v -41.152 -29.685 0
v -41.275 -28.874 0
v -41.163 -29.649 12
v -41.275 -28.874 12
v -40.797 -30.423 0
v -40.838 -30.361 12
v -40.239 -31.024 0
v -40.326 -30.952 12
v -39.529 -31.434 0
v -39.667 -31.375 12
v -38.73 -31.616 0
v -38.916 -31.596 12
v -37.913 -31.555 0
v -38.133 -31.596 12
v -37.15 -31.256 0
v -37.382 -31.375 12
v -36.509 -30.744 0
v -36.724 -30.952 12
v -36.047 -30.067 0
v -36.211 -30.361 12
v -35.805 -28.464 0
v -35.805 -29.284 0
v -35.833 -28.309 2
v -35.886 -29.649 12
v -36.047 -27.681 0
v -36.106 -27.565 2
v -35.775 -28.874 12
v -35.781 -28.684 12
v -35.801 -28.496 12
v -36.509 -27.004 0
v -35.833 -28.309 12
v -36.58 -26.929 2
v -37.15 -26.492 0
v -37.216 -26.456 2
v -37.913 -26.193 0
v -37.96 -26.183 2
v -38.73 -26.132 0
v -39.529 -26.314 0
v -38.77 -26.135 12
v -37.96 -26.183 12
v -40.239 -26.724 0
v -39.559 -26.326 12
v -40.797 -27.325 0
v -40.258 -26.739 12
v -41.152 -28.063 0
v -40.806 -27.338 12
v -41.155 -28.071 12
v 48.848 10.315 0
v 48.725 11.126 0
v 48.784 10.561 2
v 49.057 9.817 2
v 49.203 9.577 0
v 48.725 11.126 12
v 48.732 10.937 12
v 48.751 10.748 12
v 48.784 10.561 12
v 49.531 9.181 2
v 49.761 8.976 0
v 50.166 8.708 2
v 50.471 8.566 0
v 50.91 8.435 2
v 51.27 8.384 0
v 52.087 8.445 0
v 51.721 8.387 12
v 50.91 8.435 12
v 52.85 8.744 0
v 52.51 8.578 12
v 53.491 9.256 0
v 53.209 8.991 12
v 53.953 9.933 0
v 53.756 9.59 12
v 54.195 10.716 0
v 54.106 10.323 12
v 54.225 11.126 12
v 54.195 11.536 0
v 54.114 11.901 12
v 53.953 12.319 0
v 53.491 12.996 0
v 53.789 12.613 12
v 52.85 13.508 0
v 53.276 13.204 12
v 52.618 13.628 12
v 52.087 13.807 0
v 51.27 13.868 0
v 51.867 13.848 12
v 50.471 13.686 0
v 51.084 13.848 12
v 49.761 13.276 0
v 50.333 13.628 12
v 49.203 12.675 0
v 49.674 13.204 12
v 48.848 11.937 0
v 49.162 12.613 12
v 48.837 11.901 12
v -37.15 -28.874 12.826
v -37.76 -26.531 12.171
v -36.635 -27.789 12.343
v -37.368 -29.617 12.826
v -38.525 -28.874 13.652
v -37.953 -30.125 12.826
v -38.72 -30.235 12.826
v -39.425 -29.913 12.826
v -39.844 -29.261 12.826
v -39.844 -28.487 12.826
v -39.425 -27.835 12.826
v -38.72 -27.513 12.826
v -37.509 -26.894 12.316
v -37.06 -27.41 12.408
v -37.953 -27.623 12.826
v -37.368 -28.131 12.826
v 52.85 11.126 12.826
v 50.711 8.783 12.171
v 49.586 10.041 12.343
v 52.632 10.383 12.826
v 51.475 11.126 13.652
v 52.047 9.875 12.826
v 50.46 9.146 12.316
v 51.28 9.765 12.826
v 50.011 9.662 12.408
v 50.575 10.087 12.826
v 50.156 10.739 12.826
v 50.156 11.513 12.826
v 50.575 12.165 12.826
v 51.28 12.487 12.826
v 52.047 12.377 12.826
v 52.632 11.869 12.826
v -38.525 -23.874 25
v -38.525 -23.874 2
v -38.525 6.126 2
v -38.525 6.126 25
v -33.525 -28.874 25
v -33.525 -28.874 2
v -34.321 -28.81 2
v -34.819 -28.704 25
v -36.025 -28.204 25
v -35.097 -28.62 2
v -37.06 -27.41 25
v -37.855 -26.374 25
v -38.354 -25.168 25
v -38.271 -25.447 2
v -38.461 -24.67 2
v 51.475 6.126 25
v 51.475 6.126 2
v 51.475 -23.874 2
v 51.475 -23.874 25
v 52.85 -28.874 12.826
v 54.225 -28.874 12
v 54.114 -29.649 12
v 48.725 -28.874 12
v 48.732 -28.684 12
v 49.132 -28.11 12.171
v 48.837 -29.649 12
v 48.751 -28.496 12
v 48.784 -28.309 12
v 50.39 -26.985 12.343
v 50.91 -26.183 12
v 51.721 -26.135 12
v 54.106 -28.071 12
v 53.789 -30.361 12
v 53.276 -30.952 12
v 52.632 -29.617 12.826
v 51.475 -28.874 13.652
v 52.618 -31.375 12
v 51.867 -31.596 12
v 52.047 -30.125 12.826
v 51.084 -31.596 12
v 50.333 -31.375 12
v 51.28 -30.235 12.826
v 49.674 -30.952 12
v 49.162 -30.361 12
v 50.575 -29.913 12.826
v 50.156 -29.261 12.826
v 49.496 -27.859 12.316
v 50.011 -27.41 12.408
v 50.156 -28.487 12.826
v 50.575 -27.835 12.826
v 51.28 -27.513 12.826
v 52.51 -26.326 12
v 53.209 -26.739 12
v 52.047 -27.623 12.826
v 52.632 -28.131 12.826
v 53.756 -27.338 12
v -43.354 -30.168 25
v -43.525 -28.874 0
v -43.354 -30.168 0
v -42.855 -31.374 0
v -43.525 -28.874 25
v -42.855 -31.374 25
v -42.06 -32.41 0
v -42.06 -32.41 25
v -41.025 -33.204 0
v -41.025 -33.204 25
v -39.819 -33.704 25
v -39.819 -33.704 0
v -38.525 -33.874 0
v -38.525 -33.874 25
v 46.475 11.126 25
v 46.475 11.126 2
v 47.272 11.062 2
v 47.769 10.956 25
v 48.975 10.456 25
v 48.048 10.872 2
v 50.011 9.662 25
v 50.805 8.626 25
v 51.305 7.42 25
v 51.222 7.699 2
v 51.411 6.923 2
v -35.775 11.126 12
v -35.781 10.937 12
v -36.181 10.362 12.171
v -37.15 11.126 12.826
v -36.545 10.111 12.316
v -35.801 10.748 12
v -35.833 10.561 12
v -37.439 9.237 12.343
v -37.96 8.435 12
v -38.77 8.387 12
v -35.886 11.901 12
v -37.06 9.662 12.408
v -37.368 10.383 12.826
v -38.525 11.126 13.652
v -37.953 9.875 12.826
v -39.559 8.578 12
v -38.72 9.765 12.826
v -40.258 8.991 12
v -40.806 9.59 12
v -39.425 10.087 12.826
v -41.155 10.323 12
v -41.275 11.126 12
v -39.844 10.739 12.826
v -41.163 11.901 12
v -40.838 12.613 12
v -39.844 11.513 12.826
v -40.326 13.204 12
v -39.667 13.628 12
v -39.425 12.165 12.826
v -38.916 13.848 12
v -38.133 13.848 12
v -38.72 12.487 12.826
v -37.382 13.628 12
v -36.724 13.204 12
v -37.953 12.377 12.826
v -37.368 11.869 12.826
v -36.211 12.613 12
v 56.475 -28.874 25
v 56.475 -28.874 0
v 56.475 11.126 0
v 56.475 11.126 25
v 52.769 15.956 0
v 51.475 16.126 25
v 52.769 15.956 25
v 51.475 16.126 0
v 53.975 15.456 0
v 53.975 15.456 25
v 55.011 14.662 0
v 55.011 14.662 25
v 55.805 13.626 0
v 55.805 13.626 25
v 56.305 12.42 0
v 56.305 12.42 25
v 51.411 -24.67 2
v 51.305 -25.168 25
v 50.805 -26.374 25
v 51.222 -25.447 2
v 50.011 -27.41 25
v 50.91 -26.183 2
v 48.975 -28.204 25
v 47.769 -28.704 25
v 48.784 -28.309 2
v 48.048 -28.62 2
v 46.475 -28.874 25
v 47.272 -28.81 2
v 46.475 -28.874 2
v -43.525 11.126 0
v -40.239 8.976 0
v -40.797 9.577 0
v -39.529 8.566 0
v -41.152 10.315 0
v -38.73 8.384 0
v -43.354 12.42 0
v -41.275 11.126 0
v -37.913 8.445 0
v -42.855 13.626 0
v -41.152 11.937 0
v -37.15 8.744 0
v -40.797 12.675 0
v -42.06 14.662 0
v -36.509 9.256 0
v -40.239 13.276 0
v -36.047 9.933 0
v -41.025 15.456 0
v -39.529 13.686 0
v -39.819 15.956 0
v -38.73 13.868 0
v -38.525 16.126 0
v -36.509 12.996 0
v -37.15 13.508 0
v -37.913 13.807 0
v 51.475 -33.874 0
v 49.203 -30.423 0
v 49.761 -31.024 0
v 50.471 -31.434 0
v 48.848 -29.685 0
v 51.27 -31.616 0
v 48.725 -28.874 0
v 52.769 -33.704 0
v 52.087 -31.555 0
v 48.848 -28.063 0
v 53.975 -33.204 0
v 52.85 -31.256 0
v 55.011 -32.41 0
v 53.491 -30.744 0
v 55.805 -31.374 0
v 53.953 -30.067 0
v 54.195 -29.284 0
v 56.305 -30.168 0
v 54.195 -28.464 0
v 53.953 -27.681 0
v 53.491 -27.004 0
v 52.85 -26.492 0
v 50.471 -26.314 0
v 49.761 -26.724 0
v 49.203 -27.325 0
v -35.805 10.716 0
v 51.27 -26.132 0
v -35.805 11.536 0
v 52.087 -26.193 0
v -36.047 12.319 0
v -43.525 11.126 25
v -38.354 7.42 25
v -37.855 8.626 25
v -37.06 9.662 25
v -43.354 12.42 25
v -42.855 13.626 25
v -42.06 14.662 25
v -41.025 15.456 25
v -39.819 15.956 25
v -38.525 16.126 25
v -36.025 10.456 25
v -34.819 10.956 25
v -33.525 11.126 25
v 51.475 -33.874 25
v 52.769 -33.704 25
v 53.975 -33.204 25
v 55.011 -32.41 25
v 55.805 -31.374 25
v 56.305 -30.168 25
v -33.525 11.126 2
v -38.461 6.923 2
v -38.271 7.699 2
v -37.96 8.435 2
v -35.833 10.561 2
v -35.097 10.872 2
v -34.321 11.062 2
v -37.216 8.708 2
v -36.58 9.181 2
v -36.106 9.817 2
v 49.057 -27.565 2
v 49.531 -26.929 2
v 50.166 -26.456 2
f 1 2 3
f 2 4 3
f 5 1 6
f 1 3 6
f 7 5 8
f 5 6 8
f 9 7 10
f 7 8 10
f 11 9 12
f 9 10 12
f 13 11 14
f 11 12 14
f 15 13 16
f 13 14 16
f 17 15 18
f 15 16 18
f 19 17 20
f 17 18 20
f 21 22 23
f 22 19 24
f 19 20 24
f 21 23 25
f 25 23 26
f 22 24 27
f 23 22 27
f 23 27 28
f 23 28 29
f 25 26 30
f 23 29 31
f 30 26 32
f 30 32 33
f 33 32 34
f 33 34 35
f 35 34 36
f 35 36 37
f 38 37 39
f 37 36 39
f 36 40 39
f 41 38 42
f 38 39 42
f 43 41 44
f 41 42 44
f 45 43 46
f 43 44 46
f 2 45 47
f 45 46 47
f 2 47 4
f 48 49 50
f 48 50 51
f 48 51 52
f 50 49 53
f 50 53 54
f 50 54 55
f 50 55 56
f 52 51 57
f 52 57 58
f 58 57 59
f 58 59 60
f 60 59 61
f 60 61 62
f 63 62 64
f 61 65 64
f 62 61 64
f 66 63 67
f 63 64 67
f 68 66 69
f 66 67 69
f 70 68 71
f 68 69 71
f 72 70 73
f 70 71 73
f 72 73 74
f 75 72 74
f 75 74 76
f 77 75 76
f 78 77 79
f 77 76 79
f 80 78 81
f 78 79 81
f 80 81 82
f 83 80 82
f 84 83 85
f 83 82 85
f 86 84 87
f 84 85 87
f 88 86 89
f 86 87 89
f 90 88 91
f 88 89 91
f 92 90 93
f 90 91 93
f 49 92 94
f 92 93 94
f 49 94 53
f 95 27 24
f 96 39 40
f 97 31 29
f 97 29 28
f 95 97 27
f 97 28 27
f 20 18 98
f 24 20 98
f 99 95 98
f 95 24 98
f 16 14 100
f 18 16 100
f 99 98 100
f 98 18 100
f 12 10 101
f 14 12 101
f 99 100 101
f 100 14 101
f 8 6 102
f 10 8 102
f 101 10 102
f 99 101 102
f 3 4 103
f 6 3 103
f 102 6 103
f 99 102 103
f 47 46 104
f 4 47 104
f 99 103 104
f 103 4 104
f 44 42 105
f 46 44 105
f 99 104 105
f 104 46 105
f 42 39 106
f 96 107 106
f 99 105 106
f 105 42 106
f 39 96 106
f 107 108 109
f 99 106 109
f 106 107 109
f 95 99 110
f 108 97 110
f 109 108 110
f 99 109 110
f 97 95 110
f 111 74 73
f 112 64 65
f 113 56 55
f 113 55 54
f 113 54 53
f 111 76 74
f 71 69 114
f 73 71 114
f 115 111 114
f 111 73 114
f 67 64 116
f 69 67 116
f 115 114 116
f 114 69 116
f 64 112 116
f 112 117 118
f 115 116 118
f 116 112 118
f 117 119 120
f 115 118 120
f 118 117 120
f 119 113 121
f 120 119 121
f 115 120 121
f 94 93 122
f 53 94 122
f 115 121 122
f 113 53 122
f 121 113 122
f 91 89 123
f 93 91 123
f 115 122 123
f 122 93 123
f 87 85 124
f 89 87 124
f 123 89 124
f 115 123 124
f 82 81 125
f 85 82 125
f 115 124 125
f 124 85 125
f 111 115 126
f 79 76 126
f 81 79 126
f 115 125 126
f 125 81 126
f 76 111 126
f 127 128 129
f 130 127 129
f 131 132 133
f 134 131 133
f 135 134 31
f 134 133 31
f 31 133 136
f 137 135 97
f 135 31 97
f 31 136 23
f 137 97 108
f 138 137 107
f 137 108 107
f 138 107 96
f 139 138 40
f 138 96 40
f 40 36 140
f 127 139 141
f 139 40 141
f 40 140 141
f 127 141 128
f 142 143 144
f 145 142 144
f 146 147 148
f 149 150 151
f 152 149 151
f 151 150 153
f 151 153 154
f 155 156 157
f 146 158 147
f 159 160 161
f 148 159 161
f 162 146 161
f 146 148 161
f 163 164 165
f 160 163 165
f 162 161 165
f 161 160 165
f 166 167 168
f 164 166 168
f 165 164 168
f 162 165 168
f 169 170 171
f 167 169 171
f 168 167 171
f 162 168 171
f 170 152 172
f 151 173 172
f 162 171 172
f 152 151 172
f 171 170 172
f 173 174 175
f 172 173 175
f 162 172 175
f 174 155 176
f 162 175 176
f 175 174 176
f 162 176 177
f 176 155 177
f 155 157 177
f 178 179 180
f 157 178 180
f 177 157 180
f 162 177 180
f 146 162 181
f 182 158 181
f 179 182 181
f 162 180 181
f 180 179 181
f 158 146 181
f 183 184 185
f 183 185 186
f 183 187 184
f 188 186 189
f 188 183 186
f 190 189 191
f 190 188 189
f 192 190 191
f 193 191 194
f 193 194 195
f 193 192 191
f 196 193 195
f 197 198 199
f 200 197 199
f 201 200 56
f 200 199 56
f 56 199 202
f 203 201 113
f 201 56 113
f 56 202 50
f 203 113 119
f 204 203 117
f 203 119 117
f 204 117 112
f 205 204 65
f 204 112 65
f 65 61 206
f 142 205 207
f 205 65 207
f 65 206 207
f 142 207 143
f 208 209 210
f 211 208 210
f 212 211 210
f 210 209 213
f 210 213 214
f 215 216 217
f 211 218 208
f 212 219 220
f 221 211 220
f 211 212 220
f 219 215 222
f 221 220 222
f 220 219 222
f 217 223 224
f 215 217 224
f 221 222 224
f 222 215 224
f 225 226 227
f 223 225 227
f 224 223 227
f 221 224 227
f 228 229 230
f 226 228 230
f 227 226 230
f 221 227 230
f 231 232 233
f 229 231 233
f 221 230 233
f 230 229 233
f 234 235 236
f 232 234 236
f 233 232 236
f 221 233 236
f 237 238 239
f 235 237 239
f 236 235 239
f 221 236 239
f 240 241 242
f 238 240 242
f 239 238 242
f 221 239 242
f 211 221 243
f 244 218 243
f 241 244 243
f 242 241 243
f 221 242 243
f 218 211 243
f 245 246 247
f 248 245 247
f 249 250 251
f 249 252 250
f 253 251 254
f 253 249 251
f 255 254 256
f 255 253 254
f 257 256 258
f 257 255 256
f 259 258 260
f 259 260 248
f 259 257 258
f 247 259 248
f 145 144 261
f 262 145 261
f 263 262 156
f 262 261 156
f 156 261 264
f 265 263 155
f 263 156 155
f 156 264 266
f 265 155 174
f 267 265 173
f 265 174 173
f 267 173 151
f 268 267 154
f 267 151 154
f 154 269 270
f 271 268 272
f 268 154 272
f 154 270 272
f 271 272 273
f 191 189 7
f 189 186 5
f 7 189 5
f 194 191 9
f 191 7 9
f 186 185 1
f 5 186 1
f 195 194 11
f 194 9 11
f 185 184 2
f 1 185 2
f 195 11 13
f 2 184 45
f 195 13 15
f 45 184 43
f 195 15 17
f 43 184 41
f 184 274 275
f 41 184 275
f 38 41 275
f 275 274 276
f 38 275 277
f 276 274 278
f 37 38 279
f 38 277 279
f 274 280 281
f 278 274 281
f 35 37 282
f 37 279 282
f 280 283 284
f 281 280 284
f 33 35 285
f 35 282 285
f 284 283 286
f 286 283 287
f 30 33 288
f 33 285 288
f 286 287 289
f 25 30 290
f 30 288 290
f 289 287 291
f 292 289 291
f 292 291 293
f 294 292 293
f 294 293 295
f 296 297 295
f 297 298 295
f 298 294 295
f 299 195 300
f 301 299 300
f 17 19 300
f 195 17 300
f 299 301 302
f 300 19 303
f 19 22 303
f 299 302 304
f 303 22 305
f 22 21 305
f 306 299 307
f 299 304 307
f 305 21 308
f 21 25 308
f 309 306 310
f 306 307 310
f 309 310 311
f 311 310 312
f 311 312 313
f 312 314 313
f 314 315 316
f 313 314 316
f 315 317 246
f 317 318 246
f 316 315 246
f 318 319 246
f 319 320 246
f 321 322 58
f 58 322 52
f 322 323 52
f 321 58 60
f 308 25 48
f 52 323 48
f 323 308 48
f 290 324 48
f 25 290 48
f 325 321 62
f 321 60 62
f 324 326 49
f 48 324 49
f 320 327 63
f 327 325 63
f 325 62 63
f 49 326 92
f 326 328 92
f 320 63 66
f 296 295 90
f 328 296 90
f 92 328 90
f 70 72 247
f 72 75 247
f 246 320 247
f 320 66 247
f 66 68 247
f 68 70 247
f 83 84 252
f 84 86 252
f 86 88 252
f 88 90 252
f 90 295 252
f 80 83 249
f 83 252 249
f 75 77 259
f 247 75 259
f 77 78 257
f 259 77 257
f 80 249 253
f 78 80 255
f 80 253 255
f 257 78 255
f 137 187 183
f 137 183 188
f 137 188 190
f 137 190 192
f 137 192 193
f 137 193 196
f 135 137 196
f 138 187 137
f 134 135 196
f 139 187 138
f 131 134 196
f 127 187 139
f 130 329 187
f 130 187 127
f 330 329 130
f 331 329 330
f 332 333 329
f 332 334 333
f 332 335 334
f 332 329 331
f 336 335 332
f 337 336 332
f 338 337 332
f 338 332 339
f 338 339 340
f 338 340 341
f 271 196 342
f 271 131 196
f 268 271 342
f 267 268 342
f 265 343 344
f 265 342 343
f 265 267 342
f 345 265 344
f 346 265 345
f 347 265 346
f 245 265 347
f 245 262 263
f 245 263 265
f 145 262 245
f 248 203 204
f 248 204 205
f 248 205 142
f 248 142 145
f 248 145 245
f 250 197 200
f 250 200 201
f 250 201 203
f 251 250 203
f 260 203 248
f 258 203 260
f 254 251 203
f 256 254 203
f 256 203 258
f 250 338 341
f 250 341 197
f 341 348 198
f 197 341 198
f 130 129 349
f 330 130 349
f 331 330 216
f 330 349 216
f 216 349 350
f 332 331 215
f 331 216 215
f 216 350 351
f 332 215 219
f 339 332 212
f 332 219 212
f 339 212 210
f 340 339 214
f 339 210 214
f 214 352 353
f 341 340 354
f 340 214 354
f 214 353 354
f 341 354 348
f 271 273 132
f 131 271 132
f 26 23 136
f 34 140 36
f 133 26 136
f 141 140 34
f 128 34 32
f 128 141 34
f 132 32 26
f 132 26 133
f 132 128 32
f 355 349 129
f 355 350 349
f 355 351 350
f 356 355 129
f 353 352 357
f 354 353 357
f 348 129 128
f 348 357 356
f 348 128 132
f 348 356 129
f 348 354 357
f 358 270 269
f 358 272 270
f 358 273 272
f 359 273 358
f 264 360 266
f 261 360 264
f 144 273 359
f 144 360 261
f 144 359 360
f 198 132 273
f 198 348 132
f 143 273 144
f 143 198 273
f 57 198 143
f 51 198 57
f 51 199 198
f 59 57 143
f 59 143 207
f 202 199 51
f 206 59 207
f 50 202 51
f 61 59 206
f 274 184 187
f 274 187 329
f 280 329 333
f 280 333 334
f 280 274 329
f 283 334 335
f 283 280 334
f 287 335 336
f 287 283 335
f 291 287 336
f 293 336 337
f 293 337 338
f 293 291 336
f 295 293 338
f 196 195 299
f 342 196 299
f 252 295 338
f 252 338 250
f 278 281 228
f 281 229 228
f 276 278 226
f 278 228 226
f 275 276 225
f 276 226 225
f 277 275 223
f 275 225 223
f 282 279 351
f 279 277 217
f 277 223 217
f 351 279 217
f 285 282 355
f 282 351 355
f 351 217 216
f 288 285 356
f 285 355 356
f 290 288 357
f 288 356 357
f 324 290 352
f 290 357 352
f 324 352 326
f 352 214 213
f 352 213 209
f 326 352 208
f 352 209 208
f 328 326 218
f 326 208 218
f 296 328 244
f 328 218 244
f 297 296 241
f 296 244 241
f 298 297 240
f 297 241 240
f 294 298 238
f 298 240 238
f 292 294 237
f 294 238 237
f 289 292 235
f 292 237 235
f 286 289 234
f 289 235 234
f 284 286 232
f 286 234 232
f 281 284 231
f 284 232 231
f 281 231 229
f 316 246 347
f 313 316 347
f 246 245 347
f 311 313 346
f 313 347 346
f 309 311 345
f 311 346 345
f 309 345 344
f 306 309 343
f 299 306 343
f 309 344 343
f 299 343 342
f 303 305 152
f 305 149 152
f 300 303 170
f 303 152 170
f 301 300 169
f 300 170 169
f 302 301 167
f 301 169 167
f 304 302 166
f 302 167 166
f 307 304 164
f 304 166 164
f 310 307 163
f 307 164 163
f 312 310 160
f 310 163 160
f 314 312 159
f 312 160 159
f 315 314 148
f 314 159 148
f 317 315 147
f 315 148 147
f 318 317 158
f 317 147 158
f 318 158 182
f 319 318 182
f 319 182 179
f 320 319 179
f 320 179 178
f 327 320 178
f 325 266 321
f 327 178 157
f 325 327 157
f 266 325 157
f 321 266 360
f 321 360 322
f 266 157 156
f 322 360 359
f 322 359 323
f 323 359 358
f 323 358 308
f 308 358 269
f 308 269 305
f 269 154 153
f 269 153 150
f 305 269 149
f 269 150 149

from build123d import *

# Parameters (mm, degrees)
F0_W     = 100
F0_H     = 50
F1_DEPTH = 25
F2_DEPTH = 2
F3_R     = 5
F4_D     = 5.5
F4_DEPTH = 12
F4_TIP   = 1.6523667023


with BuildPart() as f1:
    # F0 (on Top) → F1 (new body)
    with BuildSketch(Plane.XY):
        with Locations((6.475339179, -8.8739781123)):
            Rectangle(F0_W, F0_H)
        with BuildLine():
            ThreePointArc((-38.524660821, 6.1260218877), (-37.0601947269, 9.6615557936), (-33.524660821, 11.1260218877))
            Line((-33.524660821, 11.1260218877), (46.475339179, 11.1260218877))
            ThreePointArc((46.475339179, 11.1260218877), (50.010873085, 9.6615557936), (51.475339179, 6.1260218877))
            Line((51.475339179, 6.1260218877), (51.475339179, -23.8739781123))
            ThreePointArc((51.475339179, -23.8739781123), (50.010873085, -27.4095120182), (46.475339179, -28.8739781123))
            Line((46.475339179, -28.8739781123), (-33.524660821, -28.8739781123))
            ThreePointArc((-33.524660821, -28.8739781123), (-37.0601947269, -27.4095120182), (-38.524660821, -23.8739781123))
            Line((-38.524660821, -23.8739781123), (-38.524660821, 6.1260218877))
        make_face(mode=Mode.SUBTRACT)
    extrude(amount=F1_DEPTH)

    # F0 (on Top) → F2 (join)
    with BuildSketch(Plane.XY):
        with Locations((6.475339179, -8.8739781123)):
            Rectangle(F0_W, F0_H)
        with BuildLine():
            ThreePointArc((-38.524660821, 6.1260218877), (-37.0601947269, 9.6615557936), (-33.524660821, 11.1260218877))
            Line((-33.524660821, 11.1260218877), (46.475339179, 11.1260218877))
            ThreePointArc((46.475339179, 11.1260218877), (50.010873085, 9.6615557936), (51.475339179, 6.1260218877))
            Line((51.475339179, 6.1260218877), (51.475339179, -23.8739781123))
            ThreePointArc((51.475339179, -23.8739781123), (50.010873085, -27.4095120182), (46.475339179, -28.8739781123))
            Line((46.475339179, -28.8739781123), (-33.524660821, -28.8739781123))
            ThreePointArc((-33.524660821, -28.8739781123), (-37.0601947269, -27.4095120182), (-38.524660821, -23.8739781123))
            Line((-38.524660821, -23.8739781123), (-38.524660821, 6.1260218877))
        make_face(mode=Mode.SUBTRACT)
        with BuildLine():
            Line((46.475339179, 11.1260218877), (-33.524660821, 11.1260218877))
            ThreePointArc((-33.524660821, 11.1260218877), (-37.0601947269, 9.6615557936), (-38.524660821, 6.1260218877))
            Line((-38.524660821, 6.1260218877), (-38.524660821, -23.8739781123))
            ThreePointArc((-38.524660821, -23.8739781123), (-37.0601947269, -27.4095120182), (-33.524660821, -28.8739781123))
            Line((-33.524660821, -28.8739781123), (46.475339179, -28.8739781123))
            ThreePointArc((46.475339179, -28.8739781123), (50.010873085, -27.4095120182), (51.475339179, -23.8739781123))
            Line((51.475339179, -23.8739781123), (51.475339179, 6.1260218877))
            ThreePointArc((51.475339179, 6.1260218877), (50.010873085, 9.6615557936), (46.475339179, 11.1260218877))
        make_face()
    extrude(amount=F2_DEPTH)

    # F3
    f3_edges = [f1.edges().sort_by_distance(p)[0] for p in [
        (-43.524661, -33.873978, 12.5),
        (56.475339, -33.873978, 12.5),
        (56.475339, 16.126022, 12.5),
        (-43.524661, 16.126022, 12.5),
    ]]
    fillet(f3_edges, radius=F3_R)

    # F4
    with Locations(Plane(origin=(0, 0, 0), x_dir=(1, 0, 0), z_dir=(0, 0, -1))):
        with Locations((51.475339179, -11.1260218877), (51.475339179, 28.8739781123), (-38.524660821, 28.8739781123), (-38.524660821, -11.1260218877)):
            Hole(F4_D / 2, depth=F4_DEPTH)
            with Locations((0, 0, -(F4_DEPTH + F4_TIP / 2))):  # 118° drill point
                Cone(0, F4_D / 2, F4_TIP, mode=Mode.SUBTRACT)


solid = f1.part
